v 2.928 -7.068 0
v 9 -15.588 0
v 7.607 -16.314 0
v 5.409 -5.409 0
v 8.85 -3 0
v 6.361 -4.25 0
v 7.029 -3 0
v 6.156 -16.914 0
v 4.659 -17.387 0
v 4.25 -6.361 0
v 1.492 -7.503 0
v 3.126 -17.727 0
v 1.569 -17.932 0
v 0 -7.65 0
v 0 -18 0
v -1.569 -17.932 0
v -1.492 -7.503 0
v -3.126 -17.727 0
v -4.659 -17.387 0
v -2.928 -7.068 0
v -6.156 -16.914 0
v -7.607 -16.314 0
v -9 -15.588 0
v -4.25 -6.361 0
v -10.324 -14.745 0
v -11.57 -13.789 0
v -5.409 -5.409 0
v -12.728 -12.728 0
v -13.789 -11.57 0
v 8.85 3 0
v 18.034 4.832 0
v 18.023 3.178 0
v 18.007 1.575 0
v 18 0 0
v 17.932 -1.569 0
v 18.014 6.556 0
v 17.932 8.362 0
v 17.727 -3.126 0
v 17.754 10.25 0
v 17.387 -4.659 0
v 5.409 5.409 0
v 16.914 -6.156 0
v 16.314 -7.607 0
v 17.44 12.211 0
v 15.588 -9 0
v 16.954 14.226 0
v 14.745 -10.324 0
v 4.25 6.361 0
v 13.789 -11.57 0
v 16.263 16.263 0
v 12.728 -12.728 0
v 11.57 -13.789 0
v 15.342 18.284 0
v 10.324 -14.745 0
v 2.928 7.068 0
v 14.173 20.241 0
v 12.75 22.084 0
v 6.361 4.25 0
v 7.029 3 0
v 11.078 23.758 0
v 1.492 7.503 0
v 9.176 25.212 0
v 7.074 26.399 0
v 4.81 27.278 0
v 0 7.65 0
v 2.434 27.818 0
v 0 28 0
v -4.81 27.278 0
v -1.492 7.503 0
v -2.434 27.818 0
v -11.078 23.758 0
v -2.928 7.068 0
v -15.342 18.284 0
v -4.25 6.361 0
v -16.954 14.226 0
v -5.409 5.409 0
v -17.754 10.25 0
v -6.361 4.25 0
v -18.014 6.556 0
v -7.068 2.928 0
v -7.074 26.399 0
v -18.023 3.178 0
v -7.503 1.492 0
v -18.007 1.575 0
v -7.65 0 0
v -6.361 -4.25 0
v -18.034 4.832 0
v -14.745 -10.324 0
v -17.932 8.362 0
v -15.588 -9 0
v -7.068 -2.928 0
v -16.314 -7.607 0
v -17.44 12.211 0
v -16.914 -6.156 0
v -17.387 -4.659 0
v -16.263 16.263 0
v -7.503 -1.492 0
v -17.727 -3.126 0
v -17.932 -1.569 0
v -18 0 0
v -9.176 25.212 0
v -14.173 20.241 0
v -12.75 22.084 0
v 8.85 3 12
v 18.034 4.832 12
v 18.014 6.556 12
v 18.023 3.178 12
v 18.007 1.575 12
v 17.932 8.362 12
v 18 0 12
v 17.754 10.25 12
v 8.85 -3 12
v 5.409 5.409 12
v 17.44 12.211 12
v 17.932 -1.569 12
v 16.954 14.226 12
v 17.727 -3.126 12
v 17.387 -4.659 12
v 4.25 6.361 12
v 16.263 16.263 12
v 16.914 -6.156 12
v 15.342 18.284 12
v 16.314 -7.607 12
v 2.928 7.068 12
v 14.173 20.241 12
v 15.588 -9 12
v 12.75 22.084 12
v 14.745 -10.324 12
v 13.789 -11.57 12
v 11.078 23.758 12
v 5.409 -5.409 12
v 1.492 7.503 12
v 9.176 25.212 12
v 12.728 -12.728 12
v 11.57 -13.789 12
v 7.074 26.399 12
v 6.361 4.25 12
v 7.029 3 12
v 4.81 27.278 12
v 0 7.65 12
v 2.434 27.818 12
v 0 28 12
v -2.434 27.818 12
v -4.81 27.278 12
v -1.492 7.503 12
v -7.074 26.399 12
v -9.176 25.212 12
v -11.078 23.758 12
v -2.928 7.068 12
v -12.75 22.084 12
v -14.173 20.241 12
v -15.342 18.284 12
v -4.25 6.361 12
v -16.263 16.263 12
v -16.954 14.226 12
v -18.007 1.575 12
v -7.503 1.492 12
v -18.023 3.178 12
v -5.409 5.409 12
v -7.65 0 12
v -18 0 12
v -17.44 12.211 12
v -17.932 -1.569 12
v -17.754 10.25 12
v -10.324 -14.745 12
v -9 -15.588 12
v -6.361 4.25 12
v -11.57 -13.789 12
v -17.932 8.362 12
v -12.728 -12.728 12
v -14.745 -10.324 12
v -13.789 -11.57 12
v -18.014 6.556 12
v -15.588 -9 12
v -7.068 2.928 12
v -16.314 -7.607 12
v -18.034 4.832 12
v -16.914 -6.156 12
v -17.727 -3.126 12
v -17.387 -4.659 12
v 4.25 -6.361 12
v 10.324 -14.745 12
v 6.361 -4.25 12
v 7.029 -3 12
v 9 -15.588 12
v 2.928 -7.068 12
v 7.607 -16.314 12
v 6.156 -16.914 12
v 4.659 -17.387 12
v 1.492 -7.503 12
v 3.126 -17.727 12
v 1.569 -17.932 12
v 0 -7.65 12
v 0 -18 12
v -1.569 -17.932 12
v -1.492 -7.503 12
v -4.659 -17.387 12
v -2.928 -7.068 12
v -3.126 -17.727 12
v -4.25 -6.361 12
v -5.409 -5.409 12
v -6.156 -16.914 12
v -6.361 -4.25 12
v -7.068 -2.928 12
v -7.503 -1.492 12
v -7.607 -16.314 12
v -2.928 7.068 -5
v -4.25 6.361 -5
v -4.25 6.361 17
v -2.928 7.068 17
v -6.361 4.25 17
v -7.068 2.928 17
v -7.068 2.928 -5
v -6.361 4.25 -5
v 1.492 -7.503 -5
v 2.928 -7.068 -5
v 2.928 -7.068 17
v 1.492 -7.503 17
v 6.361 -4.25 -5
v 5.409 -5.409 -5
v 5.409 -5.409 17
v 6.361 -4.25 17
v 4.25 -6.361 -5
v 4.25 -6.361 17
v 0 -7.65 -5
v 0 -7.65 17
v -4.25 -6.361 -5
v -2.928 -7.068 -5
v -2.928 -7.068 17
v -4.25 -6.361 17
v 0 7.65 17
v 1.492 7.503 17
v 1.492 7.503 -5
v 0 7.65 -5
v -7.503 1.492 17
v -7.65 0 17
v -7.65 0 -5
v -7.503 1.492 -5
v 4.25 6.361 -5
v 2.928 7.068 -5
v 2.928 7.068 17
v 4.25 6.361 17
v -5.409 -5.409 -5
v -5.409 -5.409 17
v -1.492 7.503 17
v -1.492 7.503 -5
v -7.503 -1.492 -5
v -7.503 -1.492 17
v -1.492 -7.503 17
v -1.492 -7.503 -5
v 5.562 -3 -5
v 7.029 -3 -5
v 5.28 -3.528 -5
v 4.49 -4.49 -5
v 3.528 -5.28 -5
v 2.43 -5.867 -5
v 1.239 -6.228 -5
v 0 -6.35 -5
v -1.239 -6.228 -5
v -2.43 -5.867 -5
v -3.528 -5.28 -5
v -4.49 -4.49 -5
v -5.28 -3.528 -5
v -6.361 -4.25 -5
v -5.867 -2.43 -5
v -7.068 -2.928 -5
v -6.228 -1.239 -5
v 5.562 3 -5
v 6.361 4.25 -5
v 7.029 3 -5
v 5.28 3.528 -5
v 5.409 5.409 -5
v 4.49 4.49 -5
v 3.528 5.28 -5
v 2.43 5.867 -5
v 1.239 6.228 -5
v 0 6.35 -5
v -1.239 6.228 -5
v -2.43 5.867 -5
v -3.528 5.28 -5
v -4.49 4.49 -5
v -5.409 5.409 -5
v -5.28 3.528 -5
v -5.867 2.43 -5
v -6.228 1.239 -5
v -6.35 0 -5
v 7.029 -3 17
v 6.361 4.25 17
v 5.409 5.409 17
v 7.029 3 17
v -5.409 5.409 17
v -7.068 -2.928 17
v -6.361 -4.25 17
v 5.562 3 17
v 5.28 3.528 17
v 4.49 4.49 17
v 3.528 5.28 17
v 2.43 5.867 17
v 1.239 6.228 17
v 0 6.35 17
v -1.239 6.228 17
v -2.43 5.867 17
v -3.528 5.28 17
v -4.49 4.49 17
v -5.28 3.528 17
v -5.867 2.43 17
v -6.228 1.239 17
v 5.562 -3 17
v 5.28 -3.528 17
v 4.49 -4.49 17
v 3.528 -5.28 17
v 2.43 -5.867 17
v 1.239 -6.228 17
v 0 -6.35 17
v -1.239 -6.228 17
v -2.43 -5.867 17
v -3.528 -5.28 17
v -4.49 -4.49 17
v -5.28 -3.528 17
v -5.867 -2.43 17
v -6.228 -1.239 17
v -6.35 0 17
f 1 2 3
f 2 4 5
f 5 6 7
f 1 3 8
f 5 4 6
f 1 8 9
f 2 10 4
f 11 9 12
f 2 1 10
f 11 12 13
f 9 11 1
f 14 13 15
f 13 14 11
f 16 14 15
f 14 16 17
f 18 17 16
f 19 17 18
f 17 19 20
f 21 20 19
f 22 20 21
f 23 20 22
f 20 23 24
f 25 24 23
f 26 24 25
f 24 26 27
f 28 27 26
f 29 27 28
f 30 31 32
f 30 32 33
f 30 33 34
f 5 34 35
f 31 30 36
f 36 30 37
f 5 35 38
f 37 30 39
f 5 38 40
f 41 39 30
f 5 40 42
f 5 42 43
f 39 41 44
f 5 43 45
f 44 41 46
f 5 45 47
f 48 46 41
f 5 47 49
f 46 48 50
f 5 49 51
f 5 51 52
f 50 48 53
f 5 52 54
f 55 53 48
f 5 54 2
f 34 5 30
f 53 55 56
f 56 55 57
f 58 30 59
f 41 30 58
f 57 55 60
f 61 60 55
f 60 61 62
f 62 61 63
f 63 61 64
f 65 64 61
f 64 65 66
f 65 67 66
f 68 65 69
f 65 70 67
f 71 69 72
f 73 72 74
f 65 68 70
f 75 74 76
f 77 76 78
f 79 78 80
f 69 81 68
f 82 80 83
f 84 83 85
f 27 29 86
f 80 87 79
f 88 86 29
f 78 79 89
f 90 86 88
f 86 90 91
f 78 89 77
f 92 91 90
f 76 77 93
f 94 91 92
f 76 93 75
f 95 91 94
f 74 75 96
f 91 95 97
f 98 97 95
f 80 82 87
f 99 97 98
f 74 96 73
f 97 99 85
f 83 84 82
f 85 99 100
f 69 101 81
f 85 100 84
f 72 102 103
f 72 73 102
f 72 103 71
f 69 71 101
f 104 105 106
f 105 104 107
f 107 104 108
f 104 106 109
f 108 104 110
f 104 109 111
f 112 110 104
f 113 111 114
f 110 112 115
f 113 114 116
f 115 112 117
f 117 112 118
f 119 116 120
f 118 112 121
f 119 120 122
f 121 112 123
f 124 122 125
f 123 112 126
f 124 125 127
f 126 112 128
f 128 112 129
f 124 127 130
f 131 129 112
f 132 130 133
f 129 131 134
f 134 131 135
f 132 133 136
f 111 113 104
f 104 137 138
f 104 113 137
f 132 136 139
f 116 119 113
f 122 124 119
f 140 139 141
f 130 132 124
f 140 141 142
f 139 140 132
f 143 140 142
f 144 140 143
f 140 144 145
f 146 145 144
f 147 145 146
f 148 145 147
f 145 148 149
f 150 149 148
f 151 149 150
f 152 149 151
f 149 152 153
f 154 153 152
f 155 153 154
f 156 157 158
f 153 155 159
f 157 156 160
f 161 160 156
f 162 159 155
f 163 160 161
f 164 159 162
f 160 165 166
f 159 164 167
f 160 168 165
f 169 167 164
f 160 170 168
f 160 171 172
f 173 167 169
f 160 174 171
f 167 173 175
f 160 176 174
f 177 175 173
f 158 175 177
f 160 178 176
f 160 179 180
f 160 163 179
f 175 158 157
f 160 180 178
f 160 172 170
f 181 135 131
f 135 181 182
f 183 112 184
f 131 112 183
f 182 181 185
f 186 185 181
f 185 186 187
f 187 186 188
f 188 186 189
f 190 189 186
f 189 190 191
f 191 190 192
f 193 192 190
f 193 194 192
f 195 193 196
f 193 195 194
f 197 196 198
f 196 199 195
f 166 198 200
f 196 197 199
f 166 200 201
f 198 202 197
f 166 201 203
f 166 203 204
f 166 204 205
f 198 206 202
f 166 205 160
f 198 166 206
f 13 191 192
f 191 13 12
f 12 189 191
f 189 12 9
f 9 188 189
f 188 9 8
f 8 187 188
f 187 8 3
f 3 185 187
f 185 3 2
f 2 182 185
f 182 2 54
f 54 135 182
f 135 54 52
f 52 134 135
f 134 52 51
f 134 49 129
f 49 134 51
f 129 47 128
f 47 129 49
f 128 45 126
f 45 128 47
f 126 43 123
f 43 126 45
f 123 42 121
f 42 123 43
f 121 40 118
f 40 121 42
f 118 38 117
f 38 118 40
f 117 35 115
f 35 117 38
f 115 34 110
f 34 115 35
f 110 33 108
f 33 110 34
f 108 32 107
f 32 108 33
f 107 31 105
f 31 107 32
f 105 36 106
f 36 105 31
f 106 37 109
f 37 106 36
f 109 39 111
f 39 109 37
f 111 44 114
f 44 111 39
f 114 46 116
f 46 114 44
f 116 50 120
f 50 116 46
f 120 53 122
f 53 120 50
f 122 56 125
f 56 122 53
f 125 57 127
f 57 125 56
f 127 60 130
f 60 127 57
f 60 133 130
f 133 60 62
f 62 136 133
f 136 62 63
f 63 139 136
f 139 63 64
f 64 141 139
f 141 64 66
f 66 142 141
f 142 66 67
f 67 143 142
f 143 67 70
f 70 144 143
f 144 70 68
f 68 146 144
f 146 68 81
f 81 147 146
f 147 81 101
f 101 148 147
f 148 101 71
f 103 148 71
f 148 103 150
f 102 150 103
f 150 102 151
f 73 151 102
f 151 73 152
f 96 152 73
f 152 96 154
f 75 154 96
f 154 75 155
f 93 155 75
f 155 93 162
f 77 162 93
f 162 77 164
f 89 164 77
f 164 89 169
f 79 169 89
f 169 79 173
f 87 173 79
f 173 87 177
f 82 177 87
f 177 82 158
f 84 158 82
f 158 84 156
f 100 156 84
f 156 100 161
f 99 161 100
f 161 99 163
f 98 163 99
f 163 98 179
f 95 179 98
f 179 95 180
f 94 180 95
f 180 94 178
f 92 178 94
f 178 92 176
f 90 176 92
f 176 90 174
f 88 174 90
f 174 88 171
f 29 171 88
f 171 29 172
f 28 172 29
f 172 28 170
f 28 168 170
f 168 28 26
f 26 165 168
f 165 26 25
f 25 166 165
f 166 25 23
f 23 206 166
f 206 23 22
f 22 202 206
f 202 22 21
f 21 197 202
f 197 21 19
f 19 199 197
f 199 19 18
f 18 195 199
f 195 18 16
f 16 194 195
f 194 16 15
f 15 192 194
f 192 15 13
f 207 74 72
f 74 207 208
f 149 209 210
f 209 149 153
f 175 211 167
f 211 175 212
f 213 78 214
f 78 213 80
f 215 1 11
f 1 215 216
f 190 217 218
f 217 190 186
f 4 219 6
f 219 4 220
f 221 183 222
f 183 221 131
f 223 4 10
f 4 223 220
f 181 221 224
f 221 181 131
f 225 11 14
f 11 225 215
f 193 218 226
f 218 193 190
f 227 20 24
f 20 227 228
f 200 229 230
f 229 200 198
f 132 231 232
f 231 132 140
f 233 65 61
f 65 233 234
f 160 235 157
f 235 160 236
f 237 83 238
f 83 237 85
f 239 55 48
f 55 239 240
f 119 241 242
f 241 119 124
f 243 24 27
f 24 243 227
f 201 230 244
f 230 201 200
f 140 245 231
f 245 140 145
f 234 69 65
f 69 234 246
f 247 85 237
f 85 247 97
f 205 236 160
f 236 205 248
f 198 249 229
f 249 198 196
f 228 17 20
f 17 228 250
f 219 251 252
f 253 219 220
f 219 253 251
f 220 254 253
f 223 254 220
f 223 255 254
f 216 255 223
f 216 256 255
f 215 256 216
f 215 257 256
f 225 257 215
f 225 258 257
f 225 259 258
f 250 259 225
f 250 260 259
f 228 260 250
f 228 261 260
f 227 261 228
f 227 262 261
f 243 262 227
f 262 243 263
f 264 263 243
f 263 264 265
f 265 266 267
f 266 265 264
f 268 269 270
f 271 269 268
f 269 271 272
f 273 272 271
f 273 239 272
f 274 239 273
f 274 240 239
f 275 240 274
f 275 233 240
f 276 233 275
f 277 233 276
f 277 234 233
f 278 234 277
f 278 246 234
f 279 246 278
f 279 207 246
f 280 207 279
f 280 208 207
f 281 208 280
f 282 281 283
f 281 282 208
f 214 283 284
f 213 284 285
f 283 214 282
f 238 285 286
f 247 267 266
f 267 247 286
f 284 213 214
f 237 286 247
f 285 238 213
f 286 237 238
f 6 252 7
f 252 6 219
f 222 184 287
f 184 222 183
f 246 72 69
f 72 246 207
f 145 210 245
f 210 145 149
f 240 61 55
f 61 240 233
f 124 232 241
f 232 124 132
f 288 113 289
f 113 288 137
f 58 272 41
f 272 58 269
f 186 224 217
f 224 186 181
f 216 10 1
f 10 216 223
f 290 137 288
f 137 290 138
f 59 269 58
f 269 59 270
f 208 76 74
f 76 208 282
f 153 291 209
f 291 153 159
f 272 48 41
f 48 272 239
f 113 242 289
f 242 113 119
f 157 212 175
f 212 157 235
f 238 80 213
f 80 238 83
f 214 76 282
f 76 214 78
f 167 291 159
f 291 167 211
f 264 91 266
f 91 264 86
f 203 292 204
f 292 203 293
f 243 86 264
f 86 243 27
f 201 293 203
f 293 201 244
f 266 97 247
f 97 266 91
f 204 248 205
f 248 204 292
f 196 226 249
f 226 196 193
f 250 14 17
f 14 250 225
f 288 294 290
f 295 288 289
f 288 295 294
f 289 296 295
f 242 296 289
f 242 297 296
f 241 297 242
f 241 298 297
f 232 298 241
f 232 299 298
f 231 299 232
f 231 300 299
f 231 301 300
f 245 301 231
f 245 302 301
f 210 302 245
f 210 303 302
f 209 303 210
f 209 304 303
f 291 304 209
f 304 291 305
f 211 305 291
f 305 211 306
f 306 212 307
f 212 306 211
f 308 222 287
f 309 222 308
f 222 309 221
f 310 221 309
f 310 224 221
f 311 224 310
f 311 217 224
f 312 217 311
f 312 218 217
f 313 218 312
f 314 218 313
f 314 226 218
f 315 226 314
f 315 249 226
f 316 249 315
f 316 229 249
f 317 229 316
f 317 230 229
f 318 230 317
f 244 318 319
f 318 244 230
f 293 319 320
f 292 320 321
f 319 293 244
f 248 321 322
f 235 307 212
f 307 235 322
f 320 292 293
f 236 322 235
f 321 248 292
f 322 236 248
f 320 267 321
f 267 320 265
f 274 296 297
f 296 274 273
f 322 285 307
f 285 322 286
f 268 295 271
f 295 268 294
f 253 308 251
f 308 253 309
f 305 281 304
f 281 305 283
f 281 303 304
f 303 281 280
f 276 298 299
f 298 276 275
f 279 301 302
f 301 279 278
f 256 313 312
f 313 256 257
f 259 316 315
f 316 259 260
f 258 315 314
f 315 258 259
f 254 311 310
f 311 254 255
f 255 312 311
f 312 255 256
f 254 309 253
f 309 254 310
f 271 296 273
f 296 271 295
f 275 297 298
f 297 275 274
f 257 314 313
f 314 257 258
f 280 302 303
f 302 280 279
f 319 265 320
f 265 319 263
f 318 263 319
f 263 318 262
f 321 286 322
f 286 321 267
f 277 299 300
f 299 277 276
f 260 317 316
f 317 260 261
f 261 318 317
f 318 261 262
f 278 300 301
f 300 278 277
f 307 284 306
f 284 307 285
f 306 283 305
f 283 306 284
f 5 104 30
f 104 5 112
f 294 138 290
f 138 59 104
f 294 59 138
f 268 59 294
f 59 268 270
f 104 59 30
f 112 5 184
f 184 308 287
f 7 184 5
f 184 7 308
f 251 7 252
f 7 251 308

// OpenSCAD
$fn = 32;

// ----------------------------------------------------------------------
// Cam: base radius 18 mm with a 10 mm lift over 180 degrees
// ----------------------------------------------------------------------

// --- parameters (mm) ---
base_r = 18;              // base radius
lift = 10;                // lift height above the base radius
lift_span = 180;          // angular width of the lift
lift_start = 0;           // angle where the lift starts
cam_t = 12;               // cam plate thickness
hub_d = 15.3;             // hub diameter
hub_h = 22;               // hub height
bore_d = 12.7;            // bore
key_w = 6;                // keyway width
key_depth = 1.6;          // keyway depth

cam_profile = [[18, 0], [18.007, 1.575], [18.023, 3.178], [18.034, 4.832], [18.014, 6.556], [17.932, 8.362], [17.754, 10.25], [17.44, 12.211], [16.954, 14.226], [16.263, 16.263], [15.342, 18.284], [14.173, 20.241], [12.75, 22.084], [11.078, 23.758], [9.176, 25.212], [7.074, 26.399], [4.81, 27.278], [2.434, 27.818], [0, 28], [-2.434, 27.818], [-4.81, 27.278], [-7.074, 26.399], [-9.176, 25.212], [-11.078, 23.758], [-12.75, 22.084], [-14.173, 20.241], [-15.342, 18.284], [-16.263, 16.263], [-16.954, 14.226], [-17.44, 12.211], [-17.754, 10.25], [-17.932, 8.362], [-18.014, 6.556], [-18.034, 4.832], [-18.023, 3.178], [-18.007, 1.575], [-18, 0], [-17.932, -1.569], [-17.727, -3.126], [-17.387, -4.659], [-16.914, -6.156], [-16.314, -7.607], [-15.588, -9], [-14.745, -10.324], [-13.789, -11.57], [-12.728, -12.728], [-11.57, -13.789], [-10.324, -14.745], [-9, -15.588], [-7.607, -16.314], [-6.156, -16.914], [-4.659, -17.387], [-3.126, -17.727], [-1.569, -17.932], [0, -18], [1.569, -17.932], [3.126, -17.727], [4.659, -17.387], [6.156, -16.914], [7.607, -16.314], [9, -15.588], [10.324, -14.745], [11.57, -13.789], [12.728, -12.728], [13.789, -11.57], [14.745, -10.324], [15.588, -9], [16.314, -7.607], [16.914, -6.156], [17.387, -4.659], [17.727, -3.126], [17.932, -1.569]];

difference() {
  union() {
    linear_extrude(height = cam_t) polygon(cam_profile);
    /* hub, proud of the cam plate on both sides */
    translate([0, 0, -5]) cylinder(h = hub_h, d = hub_d);
  }
  /* bore through the hub, 2.5 mm clear on both faces */
  translate([0, 0, -7.5]) cylinder(h = hub_h + 5, d = bore_d);
  /* keyway, milled through the whole hub */
  translate([4.75, -3, -7.5]) cube([4.1, 6, 27]);
}
